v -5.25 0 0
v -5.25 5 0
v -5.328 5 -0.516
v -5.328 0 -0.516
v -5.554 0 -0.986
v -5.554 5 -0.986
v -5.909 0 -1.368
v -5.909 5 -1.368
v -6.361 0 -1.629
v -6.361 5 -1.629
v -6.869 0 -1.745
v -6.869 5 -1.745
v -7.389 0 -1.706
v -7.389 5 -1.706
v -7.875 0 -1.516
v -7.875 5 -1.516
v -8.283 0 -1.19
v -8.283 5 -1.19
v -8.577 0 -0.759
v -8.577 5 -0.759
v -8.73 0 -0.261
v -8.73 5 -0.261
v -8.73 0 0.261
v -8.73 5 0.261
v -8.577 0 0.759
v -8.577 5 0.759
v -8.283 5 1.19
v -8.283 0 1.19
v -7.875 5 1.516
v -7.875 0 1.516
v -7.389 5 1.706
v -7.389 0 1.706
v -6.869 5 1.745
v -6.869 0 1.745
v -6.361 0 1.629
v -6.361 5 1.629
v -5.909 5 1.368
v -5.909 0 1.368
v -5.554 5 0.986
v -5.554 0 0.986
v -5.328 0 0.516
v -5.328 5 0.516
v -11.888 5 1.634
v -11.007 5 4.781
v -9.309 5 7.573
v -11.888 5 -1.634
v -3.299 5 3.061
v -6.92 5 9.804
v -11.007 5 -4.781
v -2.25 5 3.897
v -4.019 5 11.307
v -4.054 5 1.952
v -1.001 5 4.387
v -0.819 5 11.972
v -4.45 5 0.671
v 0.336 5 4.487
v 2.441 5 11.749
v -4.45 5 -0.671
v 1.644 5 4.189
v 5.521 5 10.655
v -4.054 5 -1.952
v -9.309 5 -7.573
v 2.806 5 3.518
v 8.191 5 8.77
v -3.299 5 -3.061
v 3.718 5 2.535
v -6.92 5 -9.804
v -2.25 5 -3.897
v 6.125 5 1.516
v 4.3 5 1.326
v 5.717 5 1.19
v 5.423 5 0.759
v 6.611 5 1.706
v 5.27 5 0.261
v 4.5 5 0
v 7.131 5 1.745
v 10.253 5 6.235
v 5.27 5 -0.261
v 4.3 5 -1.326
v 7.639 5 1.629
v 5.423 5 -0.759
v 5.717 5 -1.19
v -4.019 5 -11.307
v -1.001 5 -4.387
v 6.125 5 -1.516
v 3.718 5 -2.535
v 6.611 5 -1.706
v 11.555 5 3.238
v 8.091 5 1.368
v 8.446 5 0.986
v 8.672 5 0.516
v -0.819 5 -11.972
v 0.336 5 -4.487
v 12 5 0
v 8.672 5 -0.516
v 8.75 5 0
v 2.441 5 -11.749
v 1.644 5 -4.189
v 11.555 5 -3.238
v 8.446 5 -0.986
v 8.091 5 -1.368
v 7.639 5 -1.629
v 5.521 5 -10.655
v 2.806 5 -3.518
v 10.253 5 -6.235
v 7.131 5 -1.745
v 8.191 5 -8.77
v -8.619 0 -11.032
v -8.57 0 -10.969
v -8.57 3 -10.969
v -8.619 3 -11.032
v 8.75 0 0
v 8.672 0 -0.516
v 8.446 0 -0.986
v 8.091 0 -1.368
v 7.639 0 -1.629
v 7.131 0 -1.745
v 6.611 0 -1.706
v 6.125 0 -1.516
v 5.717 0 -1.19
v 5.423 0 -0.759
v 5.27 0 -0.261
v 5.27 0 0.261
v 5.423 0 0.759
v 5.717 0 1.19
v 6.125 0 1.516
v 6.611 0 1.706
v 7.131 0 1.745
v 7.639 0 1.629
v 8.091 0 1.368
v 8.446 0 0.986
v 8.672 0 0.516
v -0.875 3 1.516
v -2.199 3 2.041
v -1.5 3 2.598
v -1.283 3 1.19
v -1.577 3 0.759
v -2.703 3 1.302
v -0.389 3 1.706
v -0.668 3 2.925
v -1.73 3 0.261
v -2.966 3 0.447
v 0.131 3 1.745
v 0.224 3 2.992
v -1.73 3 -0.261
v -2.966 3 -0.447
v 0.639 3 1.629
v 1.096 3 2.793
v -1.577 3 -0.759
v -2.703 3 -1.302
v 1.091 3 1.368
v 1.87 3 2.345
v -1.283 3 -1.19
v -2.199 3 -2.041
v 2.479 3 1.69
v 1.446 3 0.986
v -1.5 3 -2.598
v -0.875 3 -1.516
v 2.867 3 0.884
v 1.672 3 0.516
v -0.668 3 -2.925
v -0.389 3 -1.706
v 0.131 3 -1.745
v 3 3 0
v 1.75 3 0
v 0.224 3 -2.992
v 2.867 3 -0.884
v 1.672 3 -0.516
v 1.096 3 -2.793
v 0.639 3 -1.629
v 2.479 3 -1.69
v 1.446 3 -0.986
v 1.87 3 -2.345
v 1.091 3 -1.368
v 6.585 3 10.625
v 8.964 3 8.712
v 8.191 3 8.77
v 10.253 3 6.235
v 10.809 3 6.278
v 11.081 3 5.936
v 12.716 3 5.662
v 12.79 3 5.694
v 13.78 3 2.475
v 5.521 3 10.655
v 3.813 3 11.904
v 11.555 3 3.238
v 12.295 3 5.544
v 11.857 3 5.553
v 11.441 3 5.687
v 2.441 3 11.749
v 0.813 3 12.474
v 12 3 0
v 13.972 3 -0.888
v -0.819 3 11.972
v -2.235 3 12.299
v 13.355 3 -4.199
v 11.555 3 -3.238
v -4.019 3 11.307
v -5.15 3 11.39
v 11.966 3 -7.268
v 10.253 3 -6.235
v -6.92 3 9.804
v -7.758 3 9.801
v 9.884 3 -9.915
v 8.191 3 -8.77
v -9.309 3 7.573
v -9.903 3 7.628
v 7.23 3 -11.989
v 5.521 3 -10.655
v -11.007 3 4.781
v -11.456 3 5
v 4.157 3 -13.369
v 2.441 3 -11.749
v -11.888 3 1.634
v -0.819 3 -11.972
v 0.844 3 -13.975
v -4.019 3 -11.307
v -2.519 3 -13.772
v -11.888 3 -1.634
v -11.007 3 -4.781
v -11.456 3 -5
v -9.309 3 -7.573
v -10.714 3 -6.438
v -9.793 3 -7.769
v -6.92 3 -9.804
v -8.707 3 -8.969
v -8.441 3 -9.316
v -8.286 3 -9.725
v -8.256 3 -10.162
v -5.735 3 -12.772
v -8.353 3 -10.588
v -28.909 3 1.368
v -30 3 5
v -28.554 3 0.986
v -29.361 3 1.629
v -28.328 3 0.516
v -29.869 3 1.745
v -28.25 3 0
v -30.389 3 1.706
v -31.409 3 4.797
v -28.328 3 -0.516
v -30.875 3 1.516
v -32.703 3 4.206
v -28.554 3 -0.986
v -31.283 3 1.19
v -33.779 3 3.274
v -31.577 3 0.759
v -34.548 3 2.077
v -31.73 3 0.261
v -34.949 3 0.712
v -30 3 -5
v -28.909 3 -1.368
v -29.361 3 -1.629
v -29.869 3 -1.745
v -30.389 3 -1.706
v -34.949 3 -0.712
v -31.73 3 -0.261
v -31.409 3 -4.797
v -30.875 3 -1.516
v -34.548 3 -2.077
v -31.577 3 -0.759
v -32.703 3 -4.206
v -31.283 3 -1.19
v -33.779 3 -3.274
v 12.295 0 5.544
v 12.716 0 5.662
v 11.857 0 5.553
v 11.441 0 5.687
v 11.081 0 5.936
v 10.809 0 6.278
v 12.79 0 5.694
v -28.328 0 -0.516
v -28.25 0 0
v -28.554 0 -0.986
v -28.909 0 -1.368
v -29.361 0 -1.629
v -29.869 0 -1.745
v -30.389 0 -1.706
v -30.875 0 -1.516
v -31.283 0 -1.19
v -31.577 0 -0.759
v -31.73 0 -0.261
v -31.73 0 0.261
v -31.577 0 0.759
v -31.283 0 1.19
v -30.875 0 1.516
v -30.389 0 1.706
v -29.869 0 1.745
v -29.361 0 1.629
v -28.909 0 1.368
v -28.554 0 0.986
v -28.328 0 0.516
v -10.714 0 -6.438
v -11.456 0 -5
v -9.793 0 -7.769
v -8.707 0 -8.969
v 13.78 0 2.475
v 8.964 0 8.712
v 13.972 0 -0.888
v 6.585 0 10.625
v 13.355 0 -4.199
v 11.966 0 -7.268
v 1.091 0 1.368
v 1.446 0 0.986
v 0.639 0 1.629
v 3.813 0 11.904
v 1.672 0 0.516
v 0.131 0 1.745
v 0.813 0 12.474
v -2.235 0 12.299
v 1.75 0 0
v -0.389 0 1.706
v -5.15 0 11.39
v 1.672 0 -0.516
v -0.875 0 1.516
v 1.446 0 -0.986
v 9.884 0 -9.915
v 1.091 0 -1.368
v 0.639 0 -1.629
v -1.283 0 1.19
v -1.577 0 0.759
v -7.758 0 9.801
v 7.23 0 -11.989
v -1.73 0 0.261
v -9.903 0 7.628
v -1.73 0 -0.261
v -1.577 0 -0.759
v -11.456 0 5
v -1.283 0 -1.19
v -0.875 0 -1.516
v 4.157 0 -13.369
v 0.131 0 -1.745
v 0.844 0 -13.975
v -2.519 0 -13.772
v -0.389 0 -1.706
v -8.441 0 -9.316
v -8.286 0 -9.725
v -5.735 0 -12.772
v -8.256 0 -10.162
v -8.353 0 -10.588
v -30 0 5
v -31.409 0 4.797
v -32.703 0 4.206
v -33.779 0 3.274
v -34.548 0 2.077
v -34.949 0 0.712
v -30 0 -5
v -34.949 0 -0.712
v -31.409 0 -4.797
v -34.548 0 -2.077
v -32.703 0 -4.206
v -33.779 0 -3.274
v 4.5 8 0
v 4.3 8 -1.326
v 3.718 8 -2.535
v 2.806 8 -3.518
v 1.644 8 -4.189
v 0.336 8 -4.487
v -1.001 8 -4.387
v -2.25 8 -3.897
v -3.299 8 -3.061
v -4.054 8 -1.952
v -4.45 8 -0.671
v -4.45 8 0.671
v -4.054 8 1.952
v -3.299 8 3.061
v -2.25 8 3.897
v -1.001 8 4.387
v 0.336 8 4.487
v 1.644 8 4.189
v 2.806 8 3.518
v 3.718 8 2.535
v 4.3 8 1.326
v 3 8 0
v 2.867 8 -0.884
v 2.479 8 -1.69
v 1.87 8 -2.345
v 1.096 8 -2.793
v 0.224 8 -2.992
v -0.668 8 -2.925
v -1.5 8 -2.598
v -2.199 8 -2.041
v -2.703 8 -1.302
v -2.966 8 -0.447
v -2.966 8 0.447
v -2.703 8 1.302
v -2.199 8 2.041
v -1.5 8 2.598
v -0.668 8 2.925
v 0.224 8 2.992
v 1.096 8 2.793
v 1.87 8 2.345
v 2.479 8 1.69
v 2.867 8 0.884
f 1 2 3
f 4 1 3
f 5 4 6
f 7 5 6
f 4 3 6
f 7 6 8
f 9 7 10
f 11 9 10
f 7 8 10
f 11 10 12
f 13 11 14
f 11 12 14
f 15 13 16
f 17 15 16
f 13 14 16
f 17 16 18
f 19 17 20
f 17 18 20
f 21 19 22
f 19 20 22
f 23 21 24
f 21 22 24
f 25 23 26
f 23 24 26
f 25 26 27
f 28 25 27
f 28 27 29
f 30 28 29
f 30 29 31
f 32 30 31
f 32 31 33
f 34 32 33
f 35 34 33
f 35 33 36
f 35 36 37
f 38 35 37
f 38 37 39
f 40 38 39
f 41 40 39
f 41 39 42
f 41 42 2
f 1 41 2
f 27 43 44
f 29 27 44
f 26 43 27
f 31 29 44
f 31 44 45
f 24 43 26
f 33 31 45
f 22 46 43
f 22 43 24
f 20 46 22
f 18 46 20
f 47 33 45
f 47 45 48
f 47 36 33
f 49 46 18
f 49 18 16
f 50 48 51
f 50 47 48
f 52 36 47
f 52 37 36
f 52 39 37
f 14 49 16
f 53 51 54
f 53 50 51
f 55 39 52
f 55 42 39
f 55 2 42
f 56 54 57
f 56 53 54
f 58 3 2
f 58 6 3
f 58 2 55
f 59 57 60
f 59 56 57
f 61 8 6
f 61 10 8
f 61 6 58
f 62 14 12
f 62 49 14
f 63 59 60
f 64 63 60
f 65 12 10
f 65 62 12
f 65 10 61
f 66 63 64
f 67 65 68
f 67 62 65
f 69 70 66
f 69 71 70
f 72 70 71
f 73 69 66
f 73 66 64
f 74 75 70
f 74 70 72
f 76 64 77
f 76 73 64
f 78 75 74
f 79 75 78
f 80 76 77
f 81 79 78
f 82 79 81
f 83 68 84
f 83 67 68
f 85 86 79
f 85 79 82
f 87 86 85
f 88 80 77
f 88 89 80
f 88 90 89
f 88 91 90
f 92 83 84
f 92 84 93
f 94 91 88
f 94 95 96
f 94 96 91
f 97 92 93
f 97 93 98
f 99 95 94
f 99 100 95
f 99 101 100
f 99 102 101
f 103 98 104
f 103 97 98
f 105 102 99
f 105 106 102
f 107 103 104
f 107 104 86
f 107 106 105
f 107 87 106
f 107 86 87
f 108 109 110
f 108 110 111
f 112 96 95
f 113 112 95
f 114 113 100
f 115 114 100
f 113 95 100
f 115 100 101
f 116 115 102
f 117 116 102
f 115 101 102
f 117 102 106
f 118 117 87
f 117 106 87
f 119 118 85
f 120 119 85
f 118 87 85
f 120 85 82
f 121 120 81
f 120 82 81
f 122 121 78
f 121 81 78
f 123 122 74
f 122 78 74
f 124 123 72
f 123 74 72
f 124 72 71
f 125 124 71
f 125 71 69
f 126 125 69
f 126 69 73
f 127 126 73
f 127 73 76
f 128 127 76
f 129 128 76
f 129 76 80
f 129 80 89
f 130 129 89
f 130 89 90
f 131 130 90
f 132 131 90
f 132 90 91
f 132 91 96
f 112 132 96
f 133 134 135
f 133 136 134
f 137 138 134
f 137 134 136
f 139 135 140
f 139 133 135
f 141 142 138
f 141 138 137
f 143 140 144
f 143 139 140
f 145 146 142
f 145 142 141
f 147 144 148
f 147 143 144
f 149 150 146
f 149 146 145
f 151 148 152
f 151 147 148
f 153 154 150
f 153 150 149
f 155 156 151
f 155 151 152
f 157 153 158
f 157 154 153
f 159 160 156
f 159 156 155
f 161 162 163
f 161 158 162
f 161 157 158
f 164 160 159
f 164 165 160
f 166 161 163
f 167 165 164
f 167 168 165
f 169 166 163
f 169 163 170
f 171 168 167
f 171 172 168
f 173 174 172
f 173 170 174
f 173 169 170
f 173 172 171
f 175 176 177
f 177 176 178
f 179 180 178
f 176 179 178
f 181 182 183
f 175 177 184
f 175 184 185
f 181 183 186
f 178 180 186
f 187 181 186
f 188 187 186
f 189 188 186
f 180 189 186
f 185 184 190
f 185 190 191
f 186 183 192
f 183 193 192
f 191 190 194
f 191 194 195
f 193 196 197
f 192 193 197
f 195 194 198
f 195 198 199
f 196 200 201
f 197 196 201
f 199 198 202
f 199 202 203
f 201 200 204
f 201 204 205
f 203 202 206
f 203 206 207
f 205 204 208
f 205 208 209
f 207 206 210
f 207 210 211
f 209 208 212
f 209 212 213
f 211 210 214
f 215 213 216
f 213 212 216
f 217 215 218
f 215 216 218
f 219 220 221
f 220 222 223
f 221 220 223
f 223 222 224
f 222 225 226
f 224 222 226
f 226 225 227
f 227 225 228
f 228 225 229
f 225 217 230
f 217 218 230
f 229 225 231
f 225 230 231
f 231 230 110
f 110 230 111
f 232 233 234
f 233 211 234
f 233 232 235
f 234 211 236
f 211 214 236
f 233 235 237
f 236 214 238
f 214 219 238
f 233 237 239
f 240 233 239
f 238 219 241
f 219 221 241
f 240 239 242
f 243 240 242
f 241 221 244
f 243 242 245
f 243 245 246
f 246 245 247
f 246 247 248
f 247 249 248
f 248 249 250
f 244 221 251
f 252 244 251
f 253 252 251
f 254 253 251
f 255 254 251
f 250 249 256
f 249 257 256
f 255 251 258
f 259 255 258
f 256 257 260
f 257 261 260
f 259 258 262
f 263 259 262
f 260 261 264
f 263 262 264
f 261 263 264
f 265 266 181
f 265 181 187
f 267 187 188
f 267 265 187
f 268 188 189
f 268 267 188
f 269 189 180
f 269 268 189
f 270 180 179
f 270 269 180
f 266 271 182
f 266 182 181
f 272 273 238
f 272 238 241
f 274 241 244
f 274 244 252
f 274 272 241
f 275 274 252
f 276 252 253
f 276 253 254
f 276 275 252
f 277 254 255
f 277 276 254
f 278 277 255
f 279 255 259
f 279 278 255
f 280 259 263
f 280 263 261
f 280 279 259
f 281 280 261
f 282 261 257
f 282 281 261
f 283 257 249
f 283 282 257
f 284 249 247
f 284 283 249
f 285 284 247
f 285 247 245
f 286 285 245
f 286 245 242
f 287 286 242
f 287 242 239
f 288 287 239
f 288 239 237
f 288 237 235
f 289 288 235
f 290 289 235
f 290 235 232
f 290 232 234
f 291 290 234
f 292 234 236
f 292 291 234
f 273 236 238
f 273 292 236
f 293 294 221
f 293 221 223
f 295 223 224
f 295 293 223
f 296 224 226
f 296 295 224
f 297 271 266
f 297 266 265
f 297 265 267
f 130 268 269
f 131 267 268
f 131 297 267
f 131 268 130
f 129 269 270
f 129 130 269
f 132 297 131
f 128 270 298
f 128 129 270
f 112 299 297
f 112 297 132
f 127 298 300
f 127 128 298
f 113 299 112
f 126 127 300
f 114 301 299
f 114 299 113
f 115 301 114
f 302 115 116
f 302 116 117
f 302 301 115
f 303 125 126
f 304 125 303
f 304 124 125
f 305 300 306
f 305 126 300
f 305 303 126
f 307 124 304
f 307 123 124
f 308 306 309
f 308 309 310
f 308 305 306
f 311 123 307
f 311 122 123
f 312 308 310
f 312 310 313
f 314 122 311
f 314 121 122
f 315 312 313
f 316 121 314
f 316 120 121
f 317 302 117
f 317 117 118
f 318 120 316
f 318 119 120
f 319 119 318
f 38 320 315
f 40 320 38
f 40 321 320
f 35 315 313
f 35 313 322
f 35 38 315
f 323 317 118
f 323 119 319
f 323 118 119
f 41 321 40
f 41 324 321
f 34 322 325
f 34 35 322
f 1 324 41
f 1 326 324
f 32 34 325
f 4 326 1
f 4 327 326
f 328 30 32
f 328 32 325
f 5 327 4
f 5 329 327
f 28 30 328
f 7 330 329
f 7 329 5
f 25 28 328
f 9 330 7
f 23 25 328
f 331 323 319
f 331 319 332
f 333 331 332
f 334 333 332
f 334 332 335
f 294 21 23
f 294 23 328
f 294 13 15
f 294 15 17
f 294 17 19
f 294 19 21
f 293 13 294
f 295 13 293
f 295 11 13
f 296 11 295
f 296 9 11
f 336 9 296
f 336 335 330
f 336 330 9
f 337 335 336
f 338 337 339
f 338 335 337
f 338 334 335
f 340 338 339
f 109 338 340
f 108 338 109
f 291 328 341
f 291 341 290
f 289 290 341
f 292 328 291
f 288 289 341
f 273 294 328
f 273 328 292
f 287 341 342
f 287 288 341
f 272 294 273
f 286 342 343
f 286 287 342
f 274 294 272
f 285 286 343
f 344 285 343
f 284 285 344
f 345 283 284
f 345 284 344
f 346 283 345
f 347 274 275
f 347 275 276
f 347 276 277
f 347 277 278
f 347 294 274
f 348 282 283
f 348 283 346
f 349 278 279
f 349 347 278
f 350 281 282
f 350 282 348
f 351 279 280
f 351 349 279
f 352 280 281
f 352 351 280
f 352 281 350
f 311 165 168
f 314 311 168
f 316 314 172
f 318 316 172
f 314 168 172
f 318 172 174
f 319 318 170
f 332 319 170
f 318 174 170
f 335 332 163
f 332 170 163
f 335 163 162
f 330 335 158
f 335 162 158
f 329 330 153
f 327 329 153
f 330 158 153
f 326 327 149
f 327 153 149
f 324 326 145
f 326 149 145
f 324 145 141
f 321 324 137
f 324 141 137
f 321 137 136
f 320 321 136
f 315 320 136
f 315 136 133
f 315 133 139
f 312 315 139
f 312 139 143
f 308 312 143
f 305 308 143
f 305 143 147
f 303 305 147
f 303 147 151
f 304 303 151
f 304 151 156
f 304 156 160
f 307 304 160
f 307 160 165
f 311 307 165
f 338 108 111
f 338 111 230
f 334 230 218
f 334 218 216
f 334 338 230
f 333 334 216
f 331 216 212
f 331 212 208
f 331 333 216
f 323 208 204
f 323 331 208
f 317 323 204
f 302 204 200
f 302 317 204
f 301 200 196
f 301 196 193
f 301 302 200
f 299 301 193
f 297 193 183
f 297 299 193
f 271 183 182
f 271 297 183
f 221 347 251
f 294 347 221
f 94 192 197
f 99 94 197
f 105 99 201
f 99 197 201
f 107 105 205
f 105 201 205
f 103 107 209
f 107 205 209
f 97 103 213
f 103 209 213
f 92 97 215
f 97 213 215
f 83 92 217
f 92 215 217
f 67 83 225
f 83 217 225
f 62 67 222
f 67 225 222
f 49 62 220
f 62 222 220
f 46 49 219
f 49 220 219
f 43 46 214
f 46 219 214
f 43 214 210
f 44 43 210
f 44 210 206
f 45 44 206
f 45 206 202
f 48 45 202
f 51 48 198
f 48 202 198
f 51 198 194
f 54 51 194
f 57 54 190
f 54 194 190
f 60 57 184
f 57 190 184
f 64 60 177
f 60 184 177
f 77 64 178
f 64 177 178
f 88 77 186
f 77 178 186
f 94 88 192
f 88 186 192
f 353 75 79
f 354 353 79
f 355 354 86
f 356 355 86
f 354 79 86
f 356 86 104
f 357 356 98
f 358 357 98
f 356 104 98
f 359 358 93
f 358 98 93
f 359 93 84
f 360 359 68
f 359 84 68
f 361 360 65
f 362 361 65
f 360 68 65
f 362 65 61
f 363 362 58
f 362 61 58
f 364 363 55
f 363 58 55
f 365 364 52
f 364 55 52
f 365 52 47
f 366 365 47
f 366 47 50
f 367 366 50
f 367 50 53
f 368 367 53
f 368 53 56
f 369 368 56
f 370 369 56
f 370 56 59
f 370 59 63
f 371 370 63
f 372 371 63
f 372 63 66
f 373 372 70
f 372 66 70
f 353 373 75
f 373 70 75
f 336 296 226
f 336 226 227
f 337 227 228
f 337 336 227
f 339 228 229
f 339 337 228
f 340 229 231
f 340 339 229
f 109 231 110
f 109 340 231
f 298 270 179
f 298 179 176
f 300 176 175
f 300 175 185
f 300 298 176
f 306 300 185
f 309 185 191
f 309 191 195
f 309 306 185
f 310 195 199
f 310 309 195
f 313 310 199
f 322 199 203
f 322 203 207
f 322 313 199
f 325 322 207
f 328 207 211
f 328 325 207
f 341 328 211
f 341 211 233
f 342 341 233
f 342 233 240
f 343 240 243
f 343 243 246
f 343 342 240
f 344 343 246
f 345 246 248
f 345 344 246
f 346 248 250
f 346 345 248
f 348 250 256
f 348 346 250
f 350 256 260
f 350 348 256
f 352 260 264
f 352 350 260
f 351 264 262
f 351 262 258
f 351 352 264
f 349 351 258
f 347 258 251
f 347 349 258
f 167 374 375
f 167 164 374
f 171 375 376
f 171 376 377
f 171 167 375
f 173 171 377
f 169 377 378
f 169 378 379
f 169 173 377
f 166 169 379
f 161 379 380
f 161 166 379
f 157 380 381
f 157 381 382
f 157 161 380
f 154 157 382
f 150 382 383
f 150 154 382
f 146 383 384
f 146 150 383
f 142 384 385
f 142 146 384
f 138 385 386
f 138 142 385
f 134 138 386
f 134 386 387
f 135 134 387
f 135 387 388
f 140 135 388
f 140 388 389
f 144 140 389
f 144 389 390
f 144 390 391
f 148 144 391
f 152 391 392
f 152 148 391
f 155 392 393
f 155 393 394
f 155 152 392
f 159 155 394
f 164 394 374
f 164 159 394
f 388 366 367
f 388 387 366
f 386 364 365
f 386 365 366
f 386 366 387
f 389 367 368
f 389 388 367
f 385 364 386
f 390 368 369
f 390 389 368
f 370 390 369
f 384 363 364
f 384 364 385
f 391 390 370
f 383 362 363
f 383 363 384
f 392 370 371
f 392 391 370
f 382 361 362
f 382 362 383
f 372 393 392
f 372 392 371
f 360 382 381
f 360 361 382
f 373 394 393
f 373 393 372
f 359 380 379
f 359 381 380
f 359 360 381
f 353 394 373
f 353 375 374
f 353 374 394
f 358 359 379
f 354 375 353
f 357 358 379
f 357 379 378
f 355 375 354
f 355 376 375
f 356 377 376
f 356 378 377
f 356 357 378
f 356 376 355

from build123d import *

# Parameters (mm, degrees)
SKETCH_1_R          = 1.75
EXTRUDE_1_DEPTH     = 3
SKETCH_2_R          = 12
EXTRUDE_2_DEPTH     = 2
SKETCH_3_R          = 4.5
SKETCH_3_R_2        = 3
EXTRUDE_3_DEPTH     = 3
SKETCH_4_R          = 3
CUT_EXTRUDE_1_DEPTH = 2
SKETCH_5_R          = 1.75
CUT_EXTRUDE_2_DEPTH = 9


with BuildPart() as part:
    # Эскиз1 → Бобышка-Вытянуть1 (new body)
    with BuildSketch(Plane(origin=(0, 0, 0), x_dir=(1, 0, 0), z_dir=(0, 1, 0))):
        with BuildLine():
            Line((-30, 5), (-11.456439237, 5))
            ThreePointArc((-11.456439237, 5), (-10.2750901, 7.118463559), (-8.706840344, 8.968886844))
            ThreePointArc((-8.706840344, 8.968886844), (-8.255178852, 9.942485712), (-8.569645055, 10.968645479))
            Line((-8.569645055, 10.968645479), (-8.619260655, 11.03215055))
            ThreePointArc((-8.619260655, 11.03215055), (8.619260655, 11.03215055), (12.789636407, -5.694313003))
            Line((12.789636407, -5.694313003), (12.716014607, -5.661534466))
            ThreePointArc((12.716014607, -5.661534466), (11.644259912, -5.604659769), (10.808847895, -6.278439868))
            ThreePointArc((10.808847895, -6.278439868), (-0.716551297, -12.47944527), (-11.456439237, -5))
            Line((-11.456439237, -5), (-30, -5))
            ThreePointArc((-30, -5), (-35, 0), (-30, 5))
        make_face()
        with Locations((-30, 0)):
            Circle(SKETCH_1_R, mode=Mode.SUBTRACT)
    extrude(amount=EXTRUDE_1_DEPTH)

    # Эскиз2 → Бобышка-Вытянуть2 (add)
    with BuildSketch(Plane(origin=(0, 3, 0), x_dir=(1, 0, 0), z_dir=(0, 1, 0))):
        Circle(SKETCH_2_R)
    extrude(amount=EXTRUDE_2_DEPTH)

    # Эскиз3 → Бобышка-Вытянуть3 (add)
    with BuildSketch(Plane(origin=(0, 5, 0), x_dir=(1, 0, 0), z_dir=(0, 1, 0))):
        Circle(SKETCH_3_R)
        Circle(SKETCH_3_R_2, mode=Mode.SUBTRACT)
    extrude(amount=EXTRUDE_3_DEPTH)

    # Эскиз4 → Вырез-Вытянуть1 (cut)
    with BuildSketch(Plane(origin=(0, 5, 0), x_dir=(1, 0, 0), z_dir=(0, 1, 0))):
        Circle(SKETCH_4_R)
    extrude(amount=-CUT_EXTRUDE_1_DEPTH, mode=Mode.SUBTRACT)

    # Эскиз5 → Вырез-Вытянуть2 (cut, through all)
    with BuildSketch(Plane(origin=(0, 8, 0), x_dir=(1, 0, 0), z_dir=(0, 1, 0))):
        Circle(SKETCH_5_R)
        with Locations((-7, 0)):
            Circle(SKETCH_5_R)
        with Locations((7, 0)):
            Circle(SKETCH_5_R)
    extrude(amount=-CUT_EXTRUDE_2_DEPTH, mode=Mode.SUBTRACT)


solid = part.part
